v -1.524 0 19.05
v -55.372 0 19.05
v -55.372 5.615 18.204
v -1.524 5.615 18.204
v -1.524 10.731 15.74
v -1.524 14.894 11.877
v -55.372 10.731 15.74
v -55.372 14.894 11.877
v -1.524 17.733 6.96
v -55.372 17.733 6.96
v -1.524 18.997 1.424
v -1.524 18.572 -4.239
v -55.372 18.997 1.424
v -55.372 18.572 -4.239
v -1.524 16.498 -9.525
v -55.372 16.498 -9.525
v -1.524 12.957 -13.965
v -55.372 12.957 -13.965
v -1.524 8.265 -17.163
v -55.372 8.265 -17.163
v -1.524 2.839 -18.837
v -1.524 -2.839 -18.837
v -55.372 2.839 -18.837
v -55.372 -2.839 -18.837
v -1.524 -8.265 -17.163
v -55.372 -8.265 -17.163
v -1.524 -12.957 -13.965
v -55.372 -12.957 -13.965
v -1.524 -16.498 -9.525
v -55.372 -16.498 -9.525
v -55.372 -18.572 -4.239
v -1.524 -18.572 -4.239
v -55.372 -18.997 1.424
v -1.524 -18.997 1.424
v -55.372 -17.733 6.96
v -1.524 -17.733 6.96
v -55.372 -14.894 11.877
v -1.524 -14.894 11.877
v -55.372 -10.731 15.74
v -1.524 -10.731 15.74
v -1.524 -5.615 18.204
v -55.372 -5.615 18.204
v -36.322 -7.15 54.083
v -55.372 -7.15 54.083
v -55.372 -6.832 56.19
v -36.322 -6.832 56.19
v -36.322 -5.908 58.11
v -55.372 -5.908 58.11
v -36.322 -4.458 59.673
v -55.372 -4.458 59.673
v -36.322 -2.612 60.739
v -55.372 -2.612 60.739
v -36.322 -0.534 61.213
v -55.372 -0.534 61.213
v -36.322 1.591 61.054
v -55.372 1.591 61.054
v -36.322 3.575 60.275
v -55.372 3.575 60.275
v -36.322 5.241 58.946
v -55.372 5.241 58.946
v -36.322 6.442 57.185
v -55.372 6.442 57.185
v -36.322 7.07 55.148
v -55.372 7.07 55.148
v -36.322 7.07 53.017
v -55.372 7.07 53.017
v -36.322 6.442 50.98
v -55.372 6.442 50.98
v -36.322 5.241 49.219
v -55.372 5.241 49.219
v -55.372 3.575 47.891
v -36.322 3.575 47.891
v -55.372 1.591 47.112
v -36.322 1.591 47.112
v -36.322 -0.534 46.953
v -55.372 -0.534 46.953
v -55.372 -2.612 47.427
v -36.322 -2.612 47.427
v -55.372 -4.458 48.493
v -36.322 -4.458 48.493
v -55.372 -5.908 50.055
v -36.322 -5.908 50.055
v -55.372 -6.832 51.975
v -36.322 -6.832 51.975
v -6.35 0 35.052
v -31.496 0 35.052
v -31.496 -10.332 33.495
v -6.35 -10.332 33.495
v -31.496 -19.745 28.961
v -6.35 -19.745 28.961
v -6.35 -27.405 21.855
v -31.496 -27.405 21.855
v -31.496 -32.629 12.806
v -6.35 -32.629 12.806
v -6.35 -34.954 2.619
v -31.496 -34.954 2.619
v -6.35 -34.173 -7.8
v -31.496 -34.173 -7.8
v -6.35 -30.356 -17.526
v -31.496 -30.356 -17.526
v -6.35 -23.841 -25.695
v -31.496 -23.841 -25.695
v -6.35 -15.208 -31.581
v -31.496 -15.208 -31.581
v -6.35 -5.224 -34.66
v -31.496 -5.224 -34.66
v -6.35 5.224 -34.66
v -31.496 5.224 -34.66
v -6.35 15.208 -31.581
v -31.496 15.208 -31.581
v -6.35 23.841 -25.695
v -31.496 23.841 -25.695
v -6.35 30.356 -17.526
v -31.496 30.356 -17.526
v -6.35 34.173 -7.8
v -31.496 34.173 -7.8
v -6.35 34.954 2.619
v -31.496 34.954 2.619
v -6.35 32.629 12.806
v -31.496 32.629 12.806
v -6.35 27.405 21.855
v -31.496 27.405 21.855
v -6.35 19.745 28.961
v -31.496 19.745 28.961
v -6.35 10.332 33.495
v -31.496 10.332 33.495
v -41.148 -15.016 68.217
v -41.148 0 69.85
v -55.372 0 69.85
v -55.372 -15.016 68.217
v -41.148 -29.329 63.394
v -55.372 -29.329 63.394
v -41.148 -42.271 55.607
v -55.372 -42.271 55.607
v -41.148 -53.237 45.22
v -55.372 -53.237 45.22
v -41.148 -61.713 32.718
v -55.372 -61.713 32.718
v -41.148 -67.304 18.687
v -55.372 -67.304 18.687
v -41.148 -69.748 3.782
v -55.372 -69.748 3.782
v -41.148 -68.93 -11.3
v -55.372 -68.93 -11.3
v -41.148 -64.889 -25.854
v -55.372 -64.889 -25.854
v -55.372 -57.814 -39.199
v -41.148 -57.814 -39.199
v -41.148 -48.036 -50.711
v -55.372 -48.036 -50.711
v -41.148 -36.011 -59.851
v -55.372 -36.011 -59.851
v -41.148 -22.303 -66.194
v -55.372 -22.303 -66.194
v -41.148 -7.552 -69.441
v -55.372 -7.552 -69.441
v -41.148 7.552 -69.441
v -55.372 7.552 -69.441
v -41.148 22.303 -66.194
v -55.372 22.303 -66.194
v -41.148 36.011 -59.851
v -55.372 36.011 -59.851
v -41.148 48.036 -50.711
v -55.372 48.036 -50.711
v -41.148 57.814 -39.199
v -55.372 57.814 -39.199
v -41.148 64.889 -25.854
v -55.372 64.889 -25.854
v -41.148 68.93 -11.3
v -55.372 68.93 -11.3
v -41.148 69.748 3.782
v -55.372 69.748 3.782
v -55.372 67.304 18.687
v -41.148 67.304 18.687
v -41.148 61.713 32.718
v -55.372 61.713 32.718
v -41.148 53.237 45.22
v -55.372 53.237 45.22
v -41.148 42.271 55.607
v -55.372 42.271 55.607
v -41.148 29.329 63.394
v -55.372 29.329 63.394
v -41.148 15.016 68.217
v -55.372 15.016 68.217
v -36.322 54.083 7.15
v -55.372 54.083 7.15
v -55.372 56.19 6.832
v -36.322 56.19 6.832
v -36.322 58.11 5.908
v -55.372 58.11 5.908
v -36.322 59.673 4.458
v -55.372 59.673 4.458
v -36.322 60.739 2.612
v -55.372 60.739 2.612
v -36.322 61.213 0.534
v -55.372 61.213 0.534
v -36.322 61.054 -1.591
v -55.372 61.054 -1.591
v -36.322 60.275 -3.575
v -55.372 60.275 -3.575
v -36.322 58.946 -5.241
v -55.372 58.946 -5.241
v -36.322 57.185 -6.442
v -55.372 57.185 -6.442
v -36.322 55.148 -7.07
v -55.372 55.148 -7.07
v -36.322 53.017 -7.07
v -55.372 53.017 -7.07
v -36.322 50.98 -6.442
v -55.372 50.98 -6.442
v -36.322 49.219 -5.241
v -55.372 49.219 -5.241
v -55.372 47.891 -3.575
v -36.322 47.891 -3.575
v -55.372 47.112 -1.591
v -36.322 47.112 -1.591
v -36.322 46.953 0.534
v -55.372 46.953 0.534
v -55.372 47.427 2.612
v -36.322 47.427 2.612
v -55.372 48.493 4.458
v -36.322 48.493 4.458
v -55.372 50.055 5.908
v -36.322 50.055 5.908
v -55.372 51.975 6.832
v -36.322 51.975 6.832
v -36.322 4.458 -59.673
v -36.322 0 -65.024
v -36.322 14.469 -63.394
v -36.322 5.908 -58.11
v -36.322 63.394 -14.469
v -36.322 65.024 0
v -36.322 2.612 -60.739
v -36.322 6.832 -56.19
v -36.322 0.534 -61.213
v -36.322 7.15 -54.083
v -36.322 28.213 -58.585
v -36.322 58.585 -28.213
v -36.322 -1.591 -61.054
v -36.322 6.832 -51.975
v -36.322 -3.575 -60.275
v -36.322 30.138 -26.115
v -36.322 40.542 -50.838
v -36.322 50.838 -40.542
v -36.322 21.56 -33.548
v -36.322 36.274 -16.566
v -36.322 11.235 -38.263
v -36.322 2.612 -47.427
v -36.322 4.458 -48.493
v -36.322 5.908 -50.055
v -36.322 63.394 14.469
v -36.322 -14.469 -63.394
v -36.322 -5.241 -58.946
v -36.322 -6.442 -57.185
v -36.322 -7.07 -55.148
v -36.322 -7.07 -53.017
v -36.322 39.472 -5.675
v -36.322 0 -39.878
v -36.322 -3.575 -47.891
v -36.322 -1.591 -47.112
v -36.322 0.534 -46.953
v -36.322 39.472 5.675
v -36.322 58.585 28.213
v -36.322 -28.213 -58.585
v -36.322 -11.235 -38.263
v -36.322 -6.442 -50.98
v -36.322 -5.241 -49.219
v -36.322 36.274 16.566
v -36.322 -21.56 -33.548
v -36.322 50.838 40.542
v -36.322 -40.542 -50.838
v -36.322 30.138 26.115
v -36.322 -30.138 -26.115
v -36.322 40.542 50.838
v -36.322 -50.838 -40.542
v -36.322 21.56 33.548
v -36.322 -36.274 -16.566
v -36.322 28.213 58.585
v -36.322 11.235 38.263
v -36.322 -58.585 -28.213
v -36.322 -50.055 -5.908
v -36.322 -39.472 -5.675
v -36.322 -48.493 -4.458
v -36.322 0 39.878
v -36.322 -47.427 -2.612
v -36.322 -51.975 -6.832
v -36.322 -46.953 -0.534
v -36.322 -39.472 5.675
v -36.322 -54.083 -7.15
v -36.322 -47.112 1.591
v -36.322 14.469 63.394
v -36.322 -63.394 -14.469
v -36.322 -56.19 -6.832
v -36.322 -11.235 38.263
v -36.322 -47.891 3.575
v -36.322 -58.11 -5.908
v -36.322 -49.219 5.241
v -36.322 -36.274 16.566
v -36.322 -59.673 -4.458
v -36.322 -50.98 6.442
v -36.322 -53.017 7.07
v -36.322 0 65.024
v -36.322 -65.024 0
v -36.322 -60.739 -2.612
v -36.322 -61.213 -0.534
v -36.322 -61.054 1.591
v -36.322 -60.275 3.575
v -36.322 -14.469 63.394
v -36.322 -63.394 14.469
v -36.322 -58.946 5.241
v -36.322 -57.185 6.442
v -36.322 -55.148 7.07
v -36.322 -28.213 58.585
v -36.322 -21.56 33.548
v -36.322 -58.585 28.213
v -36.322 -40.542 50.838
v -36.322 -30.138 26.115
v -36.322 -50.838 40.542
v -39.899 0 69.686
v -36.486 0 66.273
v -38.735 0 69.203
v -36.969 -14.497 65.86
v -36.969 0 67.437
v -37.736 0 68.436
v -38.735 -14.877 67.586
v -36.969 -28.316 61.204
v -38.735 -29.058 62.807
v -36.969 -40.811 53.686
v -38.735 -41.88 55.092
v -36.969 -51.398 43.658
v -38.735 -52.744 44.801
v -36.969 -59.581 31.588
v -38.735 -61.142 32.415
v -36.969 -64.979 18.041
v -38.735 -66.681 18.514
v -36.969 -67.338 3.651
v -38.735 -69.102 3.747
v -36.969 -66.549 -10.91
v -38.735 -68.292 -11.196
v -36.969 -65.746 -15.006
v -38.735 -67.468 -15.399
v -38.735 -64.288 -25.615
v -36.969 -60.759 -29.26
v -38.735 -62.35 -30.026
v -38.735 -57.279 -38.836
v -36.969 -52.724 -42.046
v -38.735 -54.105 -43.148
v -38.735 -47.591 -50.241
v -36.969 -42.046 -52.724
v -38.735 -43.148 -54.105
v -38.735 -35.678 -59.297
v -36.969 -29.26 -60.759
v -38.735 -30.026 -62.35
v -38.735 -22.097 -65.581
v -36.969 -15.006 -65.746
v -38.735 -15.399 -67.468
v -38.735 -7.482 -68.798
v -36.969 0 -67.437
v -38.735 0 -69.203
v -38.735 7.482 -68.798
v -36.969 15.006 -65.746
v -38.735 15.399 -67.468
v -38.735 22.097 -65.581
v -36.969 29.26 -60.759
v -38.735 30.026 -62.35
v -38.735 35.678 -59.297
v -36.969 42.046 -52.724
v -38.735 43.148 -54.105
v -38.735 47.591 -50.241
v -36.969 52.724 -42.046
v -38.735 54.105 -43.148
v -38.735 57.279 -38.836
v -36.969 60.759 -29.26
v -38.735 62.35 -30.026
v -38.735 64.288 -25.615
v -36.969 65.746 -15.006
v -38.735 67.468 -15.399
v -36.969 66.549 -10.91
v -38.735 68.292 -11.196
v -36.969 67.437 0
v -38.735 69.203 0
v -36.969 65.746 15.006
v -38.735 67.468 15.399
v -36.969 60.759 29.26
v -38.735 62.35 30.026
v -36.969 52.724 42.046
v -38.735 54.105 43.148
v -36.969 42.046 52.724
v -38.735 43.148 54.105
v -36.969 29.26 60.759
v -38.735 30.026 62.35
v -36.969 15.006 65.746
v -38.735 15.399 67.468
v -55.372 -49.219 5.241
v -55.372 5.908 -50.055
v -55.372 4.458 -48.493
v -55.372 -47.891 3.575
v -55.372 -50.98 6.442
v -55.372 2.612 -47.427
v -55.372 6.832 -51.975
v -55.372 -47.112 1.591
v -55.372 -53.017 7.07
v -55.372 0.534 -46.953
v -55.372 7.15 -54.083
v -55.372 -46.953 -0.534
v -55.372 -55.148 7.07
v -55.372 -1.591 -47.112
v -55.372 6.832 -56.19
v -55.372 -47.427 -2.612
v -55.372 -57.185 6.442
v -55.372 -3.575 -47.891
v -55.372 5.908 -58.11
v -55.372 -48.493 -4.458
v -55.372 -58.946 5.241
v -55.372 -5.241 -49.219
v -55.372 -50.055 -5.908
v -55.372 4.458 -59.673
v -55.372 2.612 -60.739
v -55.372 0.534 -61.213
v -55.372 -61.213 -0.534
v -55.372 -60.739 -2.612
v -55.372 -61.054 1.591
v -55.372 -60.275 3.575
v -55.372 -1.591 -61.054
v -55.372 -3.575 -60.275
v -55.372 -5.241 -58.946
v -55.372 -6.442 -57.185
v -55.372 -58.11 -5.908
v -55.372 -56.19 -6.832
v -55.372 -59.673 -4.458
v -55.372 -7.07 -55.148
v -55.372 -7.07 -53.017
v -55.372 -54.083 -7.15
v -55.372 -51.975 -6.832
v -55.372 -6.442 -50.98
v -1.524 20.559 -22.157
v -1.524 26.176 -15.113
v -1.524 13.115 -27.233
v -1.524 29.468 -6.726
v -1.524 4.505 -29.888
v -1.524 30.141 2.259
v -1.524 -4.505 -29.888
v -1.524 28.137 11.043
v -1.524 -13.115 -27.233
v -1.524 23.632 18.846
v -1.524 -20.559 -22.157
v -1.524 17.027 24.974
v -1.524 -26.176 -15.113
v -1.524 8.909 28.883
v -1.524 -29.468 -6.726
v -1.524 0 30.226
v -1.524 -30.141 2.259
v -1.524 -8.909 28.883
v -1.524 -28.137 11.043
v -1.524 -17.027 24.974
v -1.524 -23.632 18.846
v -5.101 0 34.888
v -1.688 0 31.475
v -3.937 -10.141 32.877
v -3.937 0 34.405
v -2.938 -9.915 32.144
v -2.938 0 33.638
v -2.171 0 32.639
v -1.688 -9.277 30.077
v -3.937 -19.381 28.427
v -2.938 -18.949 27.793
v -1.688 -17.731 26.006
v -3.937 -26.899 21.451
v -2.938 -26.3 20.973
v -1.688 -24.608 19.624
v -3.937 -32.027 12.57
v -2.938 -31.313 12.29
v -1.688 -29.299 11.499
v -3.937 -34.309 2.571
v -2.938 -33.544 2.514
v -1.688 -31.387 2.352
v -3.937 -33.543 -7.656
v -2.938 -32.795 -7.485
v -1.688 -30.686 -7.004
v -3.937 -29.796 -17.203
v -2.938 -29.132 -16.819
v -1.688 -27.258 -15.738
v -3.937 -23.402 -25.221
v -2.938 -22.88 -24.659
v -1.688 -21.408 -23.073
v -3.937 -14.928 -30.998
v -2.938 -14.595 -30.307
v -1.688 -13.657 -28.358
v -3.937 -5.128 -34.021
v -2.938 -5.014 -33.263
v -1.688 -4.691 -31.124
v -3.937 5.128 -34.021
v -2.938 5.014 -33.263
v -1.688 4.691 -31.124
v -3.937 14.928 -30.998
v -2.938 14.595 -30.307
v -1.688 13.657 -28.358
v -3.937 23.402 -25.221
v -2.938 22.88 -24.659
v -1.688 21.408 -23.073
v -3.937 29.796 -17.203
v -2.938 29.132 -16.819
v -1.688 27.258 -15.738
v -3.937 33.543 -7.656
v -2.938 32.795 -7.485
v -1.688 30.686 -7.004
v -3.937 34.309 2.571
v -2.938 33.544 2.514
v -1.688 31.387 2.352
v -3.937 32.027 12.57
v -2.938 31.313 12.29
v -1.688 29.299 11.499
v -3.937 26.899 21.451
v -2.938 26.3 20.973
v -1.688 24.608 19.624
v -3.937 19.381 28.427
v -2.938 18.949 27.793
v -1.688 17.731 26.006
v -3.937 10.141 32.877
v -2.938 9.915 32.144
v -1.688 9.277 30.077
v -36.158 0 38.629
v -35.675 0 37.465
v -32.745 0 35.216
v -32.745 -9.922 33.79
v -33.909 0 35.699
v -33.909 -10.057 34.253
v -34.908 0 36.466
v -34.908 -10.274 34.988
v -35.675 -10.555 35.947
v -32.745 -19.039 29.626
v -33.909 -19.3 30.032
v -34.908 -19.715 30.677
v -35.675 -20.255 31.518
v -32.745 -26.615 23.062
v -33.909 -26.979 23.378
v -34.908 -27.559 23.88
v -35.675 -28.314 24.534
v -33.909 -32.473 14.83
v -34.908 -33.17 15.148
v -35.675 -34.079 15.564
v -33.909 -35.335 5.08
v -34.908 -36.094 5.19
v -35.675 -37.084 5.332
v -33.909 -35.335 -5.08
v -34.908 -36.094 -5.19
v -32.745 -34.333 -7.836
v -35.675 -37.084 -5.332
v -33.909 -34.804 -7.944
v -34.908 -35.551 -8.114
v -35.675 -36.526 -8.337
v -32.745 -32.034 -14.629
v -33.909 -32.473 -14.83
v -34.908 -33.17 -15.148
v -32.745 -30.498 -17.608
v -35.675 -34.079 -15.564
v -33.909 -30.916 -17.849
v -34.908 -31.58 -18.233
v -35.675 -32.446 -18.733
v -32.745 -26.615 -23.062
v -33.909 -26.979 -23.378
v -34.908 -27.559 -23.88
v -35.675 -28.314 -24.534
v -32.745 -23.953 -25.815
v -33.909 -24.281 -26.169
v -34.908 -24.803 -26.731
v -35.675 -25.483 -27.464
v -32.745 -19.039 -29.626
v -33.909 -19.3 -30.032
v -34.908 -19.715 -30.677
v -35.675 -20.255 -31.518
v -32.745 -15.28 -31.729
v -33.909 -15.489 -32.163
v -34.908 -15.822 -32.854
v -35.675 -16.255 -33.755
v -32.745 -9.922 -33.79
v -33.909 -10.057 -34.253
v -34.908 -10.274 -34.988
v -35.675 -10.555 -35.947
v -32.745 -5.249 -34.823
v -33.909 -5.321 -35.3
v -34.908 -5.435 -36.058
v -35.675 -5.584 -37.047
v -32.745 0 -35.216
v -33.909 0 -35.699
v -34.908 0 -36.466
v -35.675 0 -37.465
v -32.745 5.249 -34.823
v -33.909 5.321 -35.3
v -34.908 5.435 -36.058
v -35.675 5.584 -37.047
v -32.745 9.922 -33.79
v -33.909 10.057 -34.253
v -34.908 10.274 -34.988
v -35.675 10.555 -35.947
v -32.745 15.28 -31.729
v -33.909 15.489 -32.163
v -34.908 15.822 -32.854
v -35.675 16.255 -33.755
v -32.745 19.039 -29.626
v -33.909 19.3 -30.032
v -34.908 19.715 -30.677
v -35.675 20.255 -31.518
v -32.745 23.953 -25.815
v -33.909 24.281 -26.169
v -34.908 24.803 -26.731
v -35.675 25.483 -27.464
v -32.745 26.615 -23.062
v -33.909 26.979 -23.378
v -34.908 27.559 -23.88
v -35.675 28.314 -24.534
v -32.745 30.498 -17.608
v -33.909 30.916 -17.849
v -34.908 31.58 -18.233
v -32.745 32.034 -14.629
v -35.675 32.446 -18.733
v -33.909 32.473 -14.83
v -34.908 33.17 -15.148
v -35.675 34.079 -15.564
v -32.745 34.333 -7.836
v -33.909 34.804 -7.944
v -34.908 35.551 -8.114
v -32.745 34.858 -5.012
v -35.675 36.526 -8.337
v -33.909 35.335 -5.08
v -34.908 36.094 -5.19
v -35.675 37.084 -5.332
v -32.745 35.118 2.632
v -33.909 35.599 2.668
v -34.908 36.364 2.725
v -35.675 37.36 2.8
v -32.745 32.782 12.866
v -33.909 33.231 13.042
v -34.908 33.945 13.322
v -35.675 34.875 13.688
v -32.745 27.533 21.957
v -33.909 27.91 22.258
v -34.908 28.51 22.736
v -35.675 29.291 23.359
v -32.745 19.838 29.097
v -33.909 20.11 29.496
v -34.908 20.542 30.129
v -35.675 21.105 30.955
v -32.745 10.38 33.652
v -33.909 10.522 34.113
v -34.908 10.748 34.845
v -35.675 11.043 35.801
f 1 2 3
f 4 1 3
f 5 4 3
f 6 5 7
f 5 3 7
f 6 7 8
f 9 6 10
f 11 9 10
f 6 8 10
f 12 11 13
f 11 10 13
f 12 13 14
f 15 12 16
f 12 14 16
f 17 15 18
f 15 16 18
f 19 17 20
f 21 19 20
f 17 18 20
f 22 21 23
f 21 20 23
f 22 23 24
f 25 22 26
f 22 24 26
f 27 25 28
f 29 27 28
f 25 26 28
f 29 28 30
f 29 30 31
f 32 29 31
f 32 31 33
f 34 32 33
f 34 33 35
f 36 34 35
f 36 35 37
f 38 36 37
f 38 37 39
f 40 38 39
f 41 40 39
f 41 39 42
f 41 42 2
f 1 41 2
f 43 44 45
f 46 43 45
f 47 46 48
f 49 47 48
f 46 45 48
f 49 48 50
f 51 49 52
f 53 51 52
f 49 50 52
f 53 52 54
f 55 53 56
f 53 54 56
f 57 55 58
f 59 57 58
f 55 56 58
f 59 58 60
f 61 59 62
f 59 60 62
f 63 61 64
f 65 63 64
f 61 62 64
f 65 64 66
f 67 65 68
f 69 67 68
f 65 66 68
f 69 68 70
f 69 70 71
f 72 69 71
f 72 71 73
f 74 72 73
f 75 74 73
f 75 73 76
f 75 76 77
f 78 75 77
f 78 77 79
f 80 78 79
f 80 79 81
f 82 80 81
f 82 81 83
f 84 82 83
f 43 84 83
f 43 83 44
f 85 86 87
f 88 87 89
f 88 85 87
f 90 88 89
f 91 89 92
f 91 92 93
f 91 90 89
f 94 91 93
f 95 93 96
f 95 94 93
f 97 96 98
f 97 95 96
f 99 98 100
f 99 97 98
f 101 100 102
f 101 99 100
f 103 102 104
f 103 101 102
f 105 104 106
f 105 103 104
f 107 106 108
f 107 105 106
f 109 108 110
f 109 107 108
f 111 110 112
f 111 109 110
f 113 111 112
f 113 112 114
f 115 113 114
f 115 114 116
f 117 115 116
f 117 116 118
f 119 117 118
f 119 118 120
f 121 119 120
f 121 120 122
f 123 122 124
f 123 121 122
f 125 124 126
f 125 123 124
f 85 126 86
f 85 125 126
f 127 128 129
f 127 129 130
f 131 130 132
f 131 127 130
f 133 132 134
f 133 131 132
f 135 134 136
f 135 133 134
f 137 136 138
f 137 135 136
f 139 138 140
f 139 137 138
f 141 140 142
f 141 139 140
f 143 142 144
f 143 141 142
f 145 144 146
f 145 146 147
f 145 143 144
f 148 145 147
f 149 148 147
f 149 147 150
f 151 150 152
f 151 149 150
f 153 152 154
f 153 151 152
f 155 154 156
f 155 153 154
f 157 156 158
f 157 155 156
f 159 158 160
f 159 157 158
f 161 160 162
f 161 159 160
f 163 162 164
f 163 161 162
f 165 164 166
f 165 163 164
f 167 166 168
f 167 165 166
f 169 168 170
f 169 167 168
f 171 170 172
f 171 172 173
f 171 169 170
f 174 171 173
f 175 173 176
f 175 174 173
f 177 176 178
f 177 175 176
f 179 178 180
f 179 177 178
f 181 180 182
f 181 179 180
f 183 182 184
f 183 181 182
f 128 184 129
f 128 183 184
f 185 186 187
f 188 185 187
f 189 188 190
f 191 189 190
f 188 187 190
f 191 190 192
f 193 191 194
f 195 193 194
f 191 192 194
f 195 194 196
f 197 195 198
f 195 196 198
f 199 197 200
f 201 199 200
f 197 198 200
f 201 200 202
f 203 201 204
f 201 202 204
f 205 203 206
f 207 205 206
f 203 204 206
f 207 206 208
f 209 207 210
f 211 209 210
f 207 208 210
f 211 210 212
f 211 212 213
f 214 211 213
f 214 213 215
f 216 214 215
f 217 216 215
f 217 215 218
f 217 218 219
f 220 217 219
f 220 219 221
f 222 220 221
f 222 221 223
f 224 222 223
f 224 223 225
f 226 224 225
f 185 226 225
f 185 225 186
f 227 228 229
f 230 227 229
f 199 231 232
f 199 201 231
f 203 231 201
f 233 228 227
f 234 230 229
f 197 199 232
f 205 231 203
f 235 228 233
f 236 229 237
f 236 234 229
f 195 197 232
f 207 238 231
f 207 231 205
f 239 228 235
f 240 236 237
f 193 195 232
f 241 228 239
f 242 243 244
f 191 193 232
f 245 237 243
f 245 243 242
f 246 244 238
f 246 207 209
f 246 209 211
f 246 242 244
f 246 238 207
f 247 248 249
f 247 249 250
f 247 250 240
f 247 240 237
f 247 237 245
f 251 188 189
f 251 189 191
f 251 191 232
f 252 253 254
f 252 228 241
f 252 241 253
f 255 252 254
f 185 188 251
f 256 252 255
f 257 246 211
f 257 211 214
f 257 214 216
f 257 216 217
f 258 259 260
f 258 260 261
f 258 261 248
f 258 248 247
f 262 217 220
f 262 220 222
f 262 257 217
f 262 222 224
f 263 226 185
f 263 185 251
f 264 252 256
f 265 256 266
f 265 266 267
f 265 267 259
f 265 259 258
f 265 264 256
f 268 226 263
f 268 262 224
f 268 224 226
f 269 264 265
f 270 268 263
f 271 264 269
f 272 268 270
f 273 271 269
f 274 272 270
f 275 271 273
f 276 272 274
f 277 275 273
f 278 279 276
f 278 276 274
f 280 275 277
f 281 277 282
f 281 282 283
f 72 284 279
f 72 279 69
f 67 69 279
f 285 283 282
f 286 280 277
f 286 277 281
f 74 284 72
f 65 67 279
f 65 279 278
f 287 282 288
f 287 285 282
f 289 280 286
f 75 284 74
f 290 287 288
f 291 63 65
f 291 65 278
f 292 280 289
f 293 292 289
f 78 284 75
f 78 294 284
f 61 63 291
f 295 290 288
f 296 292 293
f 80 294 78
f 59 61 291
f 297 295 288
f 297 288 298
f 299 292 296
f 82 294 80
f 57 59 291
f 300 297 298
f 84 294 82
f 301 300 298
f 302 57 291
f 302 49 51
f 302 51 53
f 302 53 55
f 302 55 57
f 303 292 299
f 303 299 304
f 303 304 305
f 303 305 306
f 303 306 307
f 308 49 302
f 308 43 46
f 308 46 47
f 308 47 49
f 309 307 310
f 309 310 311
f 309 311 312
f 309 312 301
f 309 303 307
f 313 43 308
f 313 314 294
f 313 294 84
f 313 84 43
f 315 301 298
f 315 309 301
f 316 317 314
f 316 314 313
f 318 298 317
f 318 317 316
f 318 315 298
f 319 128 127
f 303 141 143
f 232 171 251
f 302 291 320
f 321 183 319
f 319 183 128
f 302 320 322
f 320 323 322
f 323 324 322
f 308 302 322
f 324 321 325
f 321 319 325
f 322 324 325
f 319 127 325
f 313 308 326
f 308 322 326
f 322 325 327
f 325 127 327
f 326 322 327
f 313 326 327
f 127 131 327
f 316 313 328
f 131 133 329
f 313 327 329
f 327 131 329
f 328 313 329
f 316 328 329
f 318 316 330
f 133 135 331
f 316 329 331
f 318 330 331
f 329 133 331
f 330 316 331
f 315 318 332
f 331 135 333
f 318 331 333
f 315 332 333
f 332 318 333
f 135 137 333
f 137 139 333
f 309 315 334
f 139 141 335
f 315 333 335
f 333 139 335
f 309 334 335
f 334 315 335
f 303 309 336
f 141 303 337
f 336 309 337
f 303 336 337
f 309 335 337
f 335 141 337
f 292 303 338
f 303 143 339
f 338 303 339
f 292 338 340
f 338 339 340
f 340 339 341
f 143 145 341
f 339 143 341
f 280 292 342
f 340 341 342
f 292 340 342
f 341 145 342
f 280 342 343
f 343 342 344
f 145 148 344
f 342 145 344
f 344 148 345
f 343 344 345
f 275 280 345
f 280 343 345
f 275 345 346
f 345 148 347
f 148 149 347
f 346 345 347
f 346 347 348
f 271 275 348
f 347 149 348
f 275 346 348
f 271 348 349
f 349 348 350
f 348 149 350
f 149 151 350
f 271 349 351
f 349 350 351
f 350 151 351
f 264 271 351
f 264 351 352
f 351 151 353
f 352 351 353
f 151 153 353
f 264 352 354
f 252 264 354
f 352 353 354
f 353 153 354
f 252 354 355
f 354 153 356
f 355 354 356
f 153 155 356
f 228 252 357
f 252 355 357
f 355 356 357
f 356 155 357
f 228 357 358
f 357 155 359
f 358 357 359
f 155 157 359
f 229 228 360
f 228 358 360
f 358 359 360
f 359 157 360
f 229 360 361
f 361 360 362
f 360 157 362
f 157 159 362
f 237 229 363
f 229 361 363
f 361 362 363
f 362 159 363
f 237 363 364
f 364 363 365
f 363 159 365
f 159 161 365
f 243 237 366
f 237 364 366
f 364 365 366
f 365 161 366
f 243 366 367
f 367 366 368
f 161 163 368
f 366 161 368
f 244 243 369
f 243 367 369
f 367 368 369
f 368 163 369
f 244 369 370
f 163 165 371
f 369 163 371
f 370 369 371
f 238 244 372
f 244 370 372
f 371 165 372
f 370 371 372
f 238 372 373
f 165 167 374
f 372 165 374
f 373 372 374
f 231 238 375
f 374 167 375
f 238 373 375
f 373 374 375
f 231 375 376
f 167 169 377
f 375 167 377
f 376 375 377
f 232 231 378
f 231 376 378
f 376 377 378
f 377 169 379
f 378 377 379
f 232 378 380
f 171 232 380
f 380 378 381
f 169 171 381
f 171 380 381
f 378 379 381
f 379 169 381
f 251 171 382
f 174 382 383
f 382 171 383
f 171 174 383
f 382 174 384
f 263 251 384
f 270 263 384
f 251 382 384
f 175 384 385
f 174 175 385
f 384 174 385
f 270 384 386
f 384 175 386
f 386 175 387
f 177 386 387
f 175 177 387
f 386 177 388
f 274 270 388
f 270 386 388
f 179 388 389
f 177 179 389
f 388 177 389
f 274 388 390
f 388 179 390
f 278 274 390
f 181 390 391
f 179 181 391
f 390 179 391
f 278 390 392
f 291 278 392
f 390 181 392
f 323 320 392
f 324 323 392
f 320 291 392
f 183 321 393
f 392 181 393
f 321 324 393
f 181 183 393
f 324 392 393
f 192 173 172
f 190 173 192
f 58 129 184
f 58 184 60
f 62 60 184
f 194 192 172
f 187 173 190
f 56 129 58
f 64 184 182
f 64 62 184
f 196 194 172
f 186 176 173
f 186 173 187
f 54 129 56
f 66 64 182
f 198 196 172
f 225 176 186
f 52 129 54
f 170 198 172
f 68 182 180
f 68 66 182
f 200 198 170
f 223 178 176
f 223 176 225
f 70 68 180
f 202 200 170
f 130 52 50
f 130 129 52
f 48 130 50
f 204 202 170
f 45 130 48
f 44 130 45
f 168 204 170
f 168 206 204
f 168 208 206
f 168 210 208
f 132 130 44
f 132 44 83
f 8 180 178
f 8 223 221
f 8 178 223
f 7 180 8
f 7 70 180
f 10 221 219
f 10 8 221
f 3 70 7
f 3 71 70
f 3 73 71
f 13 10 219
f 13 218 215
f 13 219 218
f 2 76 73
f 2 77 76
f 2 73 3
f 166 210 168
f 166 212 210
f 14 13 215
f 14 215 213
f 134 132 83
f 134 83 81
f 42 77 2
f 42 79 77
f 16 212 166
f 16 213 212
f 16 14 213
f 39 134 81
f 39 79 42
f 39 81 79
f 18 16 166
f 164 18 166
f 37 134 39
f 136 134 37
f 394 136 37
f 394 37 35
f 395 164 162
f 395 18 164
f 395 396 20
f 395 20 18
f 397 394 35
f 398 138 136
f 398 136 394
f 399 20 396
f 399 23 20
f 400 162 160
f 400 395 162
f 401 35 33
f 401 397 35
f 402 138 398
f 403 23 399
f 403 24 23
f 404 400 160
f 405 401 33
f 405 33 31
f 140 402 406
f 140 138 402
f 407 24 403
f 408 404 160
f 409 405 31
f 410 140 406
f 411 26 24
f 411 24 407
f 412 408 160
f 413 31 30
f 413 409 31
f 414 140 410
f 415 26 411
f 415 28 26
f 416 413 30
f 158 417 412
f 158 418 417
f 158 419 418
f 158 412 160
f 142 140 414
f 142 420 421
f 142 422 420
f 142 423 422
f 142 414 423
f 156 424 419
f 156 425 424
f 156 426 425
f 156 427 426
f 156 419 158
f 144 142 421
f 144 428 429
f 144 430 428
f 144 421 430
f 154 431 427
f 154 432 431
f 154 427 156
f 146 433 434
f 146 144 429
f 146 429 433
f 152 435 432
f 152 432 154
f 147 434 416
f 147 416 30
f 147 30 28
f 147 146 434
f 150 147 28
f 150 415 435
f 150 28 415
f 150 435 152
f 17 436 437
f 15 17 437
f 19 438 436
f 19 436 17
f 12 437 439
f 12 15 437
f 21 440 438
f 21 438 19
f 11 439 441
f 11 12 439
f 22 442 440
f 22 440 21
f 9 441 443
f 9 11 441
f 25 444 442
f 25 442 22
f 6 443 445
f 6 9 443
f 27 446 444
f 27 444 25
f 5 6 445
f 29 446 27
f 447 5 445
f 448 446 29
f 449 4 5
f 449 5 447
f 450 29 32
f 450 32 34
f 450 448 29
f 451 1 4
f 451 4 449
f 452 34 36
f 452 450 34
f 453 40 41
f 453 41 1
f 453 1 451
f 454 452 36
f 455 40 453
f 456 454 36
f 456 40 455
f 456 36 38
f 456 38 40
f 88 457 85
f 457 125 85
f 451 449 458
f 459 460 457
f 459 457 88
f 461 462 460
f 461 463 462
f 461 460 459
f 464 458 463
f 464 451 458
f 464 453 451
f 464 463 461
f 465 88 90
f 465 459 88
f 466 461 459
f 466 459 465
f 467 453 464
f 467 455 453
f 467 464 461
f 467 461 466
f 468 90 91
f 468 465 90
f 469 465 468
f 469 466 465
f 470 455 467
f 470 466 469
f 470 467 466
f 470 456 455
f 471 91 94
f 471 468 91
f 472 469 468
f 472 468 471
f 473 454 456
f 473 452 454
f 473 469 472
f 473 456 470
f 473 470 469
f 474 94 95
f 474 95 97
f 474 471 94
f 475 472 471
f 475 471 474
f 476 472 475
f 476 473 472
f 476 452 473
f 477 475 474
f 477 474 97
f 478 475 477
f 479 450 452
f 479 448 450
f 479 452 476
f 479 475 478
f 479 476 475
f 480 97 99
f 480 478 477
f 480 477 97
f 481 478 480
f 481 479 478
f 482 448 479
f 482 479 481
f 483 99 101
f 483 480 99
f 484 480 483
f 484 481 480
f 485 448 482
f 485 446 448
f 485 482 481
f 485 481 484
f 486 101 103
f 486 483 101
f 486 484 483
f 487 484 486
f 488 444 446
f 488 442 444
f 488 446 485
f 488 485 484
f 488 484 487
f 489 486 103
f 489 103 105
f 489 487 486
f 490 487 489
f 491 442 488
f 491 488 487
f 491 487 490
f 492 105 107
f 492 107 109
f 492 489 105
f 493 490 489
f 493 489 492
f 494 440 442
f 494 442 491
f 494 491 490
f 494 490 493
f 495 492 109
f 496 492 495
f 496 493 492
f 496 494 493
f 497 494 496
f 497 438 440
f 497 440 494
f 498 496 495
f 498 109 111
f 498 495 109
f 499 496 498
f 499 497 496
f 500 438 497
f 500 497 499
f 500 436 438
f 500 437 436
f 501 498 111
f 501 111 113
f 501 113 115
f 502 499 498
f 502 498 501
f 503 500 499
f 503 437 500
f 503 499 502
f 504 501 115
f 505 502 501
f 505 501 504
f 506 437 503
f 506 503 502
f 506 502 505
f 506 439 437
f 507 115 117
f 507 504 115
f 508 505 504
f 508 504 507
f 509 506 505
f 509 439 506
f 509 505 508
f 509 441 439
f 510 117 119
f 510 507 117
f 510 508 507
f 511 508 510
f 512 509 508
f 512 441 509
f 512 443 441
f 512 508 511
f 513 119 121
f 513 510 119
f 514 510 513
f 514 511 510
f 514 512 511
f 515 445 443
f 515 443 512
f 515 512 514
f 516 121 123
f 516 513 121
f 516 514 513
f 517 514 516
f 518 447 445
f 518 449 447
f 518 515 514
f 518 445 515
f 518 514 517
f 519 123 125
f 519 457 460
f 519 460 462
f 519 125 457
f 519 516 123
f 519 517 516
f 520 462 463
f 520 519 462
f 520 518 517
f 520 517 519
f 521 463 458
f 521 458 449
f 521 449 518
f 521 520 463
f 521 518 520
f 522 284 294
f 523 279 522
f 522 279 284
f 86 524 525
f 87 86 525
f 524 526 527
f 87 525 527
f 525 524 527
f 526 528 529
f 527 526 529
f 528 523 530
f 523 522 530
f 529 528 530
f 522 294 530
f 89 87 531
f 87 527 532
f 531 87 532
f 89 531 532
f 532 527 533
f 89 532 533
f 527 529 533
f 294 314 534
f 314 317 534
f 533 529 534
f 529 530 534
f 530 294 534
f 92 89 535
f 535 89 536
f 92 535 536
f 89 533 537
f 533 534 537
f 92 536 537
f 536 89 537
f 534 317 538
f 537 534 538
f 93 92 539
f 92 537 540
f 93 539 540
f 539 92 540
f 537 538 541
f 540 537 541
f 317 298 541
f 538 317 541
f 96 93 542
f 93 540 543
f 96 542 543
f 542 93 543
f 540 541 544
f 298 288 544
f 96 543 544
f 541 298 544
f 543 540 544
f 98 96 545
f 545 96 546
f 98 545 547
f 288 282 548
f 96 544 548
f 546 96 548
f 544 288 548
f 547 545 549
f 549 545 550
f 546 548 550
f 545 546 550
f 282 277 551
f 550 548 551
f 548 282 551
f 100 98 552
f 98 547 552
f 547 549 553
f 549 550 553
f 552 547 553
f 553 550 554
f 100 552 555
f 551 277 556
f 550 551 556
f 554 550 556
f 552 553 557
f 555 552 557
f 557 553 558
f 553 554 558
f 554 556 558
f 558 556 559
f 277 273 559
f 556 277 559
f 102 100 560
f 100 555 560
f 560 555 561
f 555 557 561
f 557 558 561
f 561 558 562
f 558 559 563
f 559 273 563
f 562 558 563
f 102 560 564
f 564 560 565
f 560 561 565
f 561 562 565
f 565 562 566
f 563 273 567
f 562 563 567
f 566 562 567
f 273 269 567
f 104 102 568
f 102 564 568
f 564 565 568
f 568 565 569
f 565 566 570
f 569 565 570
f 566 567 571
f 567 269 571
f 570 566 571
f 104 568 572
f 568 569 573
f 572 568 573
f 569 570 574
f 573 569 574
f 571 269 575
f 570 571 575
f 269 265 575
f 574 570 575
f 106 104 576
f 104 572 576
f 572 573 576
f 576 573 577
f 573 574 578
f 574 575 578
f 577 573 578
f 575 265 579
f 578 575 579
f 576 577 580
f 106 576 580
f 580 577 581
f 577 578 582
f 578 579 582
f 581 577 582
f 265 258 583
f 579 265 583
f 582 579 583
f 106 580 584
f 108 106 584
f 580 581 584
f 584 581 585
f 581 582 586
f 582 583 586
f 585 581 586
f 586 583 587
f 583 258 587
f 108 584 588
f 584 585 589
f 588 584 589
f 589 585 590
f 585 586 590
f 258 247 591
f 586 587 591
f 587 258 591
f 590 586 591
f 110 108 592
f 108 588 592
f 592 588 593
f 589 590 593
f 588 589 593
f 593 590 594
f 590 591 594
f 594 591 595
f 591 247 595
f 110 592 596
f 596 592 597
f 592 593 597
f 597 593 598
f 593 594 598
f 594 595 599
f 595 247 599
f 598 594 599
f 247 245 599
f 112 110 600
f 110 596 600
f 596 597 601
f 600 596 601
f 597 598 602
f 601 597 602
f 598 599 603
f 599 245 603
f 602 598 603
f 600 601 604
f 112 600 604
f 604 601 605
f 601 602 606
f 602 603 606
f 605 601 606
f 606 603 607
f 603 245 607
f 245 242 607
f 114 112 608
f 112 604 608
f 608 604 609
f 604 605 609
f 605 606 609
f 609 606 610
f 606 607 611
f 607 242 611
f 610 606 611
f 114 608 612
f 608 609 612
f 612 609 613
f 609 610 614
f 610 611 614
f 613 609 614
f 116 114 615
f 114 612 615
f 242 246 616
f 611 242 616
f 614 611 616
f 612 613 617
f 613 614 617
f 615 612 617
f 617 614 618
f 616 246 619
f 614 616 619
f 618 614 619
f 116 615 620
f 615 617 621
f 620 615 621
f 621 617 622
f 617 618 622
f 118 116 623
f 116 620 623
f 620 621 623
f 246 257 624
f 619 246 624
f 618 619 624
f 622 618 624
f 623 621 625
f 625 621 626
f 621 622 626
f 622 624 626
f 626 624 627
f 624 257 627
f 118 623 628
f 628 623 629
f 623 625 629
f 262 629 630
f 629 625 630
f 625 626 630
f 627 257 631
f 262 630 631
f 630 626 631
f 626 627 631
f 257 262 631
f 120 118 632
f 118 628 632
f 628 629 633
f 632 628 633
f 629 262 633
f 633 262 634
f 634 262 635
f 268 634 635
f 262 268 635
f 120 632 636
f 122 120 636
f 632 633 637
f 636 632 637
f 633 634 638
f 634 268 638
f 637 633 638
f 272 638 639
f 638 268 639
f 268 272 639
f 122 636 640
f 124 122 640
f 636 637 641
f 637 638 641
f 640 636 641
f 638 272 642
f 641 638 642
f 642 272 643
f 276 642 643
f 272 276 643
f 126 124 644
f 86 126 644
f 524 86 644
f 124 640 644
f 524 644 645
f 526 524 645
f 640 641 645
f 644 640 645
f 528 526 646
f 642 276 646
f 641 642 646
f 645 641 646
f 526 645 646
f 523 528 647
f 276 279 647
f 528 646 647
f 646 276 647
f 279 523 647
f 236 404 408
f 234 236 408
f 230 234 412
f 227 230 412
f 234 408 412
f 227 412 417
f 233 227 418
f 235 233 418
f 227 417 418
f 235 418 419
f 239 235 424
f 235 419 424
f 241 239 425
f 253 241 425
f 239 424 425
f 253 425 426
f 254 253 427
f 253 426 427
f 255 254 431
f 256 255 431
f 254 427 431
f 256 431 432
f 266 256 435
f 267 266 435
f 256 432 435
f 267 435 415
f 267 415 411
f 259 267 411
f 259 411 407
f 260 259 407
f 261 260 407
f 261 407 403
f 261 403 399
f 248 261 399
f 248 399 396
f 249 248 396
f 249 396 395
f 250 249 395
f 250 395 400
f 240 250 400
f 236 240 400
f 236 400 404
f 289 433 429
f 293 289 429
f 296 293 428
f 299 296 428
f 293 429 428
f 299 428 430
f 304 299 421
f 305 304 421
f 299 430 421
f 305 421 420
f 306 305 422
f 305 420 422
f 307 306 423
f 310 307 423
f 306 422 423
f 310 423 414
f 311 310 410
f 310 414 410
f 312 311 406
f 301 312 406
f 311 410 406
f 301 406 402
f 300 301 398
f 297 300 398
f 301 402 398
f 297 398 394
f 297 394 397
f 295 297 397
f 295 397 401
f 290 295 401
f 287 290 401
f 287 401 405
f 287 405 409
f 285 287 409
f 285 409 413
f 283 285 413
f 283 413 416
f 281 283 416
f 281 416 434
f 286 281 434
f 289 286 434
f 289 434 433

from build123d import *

# Parameters (mm, degrees)
SKETCH4_R          = 19.05
CUT_EXTRUDE3_DEPTH = 113.506231401
SKETCH6_R          = 7.1501
CUT_EXTRUDE5_DEPTH = 113.506231401
CIRPATTERN2_COUNT  = 4
FILLET1_R          = 4.826


with BuildPart() as part:
    # Sketch1 → Revolve1 (revolve)
    with BuildSketch(Plane.XY, mode=Mode.PRIVATE) as revolve1_sk:
        Polygon((-36.322, 35.052), (-1.524, 35.052), (-1.524, 0), (-55.372, 0), (-55.372, 69.85), (-36.322, 69.85), align=None)
    revolve(revolve1_sk.sketch.rotate(Axis((-88.771392405, 0, 0), (1, 0, 0)), 90), axis=Axis((-88.771392405, 0, 0), (1, 0, 0)))

    # Sketch4 → Cut-Extrude3 (cut, through all)
    with BuildSketch(Plane.ZY.offset(55.372)):
        Circle(SKETCH4_R)
    extrude(amount=-CUT_EXTRUDE3_DEPTH, mode=Mode.SUBTRACT)

    # Sketch6 → Cut-Extrude5 (cut, through all)
    with BuildSketch(Plane.ZY.offset(55.372)):
        with Locations((0, 54.082681536)):
            Circle(SKETCH6_R)
    cut_extrude5 = extrude(amount=-CUT_EXTRUDE5_DEPTH, mode=Mode.SUBTRACT)

    # CirPattern2: Cut-Extrude5 ×4 about axis
    cirpattern2_axis = Axis((0, 0, 0), (1, 0, 0))
    for i in range(1, CIRPATTERN2_COUNT):
        add(cut_extrude5.rotate(cirpattern2_axis, i * 360 / CIRPATTERN2_COUNT), mode=Mode.SUBTRACT)

    # Fillet1
    fillet1_edges = [part.edges().sort_by_distance(p)[0] for p in [
        (-36.322, 0, -35.052),
        (-1.524, 0, -35.052),
        (-36.322, 0, -69.85),
    ]]
    fillet(fillet1_edges, radius=FILLET1_R)


solid = part.part
